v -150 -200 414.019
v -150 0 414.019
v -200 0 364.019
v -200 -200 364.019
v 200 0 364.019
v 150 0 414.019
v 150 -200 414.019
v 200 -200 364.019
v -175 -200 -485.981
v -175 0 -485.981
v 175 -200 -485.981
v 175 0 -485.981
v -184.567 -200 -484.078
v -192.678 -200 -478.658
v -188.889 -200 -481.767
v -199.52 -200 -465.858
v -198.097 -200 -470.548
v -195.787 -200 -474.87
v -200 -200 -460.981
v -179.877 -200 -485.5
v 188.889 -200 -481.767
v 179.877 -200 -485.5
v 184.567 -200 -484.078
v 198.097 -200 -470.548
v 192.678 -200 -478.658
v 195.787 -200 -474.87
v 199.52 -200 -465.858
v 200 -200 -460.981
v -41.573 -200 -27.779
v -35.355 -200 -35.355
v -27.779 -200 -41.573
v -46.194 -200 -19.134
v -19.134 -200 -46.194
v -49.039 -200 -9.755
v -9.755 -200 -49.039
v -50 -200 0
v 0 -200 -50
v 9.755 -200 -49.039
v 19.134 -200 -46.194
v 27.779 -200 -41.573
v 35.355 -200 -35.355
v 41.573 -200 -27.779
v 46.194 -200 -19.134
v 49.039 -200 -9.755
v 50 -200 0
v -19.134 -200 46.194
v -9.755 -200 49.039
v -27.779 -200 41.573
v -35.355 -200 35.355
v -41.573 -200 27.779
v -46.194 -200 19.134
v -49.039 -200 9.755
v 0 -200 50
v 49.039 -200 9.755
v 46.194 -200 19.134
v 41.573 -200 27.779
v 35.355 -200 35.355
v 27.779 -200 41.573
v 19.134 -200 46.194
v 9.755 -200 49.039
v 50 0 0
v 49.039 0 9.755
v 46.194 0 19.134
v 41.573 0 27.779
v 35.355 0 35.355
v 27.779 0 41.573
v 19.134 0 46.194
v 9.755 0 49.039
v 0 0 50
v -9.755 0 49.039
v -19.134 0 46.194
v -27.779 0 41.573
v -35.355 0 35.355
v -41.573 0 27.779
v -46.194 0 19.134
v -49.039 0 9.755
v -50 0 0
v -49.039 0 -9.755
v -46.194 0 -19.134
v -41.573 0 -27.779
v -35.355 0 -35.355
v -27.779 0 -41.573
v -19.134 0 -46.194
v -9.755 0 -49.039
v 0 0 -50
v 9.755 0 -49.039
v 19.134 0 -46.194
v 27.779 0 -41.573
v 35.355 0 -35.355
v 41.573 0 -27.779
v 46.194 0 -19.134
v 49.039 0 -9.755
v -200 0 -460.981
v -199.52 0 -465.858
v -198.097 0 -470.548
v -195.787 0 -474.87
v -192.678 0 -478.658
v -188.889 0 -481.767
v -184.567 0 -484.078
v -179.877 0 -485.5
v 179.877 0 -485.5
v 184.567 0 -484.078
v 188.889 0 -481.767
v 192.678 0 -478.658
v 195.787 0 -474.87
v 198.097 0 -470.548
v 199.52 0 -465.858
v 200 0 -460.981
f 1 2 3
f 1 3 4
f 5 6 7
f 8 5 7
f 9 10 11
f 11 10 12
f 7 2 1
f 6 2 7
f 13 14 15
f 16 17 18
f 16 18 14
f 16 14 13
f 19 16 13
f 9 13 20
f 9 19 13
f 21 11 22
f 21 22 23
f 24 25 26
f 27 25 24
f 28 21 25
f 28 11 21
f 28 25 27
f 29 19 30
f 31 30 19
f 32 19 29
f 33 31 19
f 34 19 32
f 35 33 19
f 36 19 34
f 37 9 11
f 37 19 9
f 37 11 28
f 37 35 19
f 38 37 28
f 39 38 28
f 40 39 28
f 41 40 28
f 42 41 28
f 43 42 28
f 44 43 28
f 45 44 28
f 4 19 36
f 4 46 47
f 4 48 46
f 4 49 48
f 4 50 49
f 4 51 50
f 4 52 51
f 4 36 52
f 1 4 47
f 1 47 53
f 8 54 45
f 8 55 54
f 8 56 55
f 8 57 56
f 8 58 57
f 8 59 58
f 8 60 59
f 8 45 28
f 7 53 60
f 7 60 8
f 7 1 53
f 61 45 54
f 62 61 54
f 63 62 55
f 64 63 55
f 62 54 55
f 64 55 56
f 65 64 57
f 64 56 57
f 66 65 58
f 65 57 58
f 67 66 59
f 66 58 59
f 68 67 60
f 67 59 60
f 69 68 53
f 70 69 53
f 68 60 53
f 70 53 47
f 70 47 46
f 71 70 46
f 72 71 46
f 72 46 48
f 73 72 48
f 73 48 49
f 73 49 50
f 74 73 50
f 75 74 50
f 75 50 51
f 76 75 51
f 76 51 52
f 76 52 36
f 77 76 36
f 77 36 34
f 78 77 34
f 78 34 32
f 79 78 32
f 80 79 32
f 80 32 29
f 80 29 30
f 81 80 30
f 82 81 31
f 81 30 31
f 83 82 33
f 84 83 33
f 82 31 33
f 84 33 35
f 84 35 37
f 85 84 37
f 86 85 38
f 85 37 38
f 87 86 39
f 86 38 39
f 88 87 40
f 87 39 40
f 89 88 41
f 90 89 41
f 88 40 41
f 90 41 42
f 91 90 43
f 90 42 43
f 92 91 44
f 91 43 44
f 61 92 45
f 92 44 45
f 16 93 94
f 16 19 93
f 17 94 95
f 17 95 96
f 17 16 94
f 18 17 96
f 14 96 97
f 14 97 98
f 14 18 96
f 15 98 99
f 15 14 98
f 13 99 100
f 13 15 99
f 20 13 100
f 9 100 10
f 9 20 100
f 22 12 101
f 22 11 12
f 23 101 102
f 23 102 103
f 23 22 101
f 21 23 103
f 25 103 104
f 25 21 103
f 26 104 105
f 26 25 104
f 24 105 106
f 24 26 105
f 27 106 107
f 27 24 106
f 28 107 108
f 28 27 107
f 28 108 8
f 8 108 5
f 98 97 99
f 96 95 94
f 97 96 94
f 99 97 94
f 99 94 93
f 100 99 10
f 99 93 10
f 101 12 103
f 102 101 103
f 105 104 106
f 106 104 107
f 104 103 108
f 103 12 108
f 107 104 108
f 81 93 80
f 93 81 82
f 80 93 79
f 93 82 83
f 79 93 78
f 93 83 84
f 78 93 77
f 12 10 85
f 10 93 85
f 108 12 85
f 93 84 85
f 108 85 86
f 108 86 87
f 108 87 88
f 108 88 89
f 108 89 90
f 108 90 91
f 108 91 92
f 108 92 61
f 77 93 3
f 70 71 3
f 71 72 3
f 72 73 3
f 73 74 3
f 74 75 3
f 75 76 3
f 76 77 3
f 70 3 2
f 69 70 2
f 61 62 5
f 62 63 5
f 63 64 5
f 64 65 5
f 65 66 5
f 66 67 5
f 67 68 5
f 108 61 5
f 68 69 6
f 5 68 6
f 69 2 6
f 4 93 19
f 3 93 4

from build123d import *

# Parameters (mm, degrees)
F0_W     = 400
F0_H     = 900
F1_DEPTH = 200
F2_SIZE  = 50
F3_R     = 25
F4_R     = 50
F5_DEPTH = 200.001


with BuildPart() as f1:
    # F0 (on Front) → F1 (new body)
    with BuildSketch(Plane.XZ):
        with Locations((0, -35.980602)):
            Rectangle(F0_W, F0_H)
    extrude(amount=F1_DEPTH)

    # F2
    f2_edges = [f1.edges().sort_by_distance(p)[0] for p in [
        (-200, -100, 414.019398),
        (200, -100, 414.019398),
    ]]
    chamfer(f2_edges, length=F2_SIZE)

    # F3
    f3_edges = [f1.edges().sort_by_distance(p)[0] for p in [
        (-200, -100, -485.980602),
        (200, -100, -485.980602),
    ]]
    fillet(f3_edges, radius=F3_R)

    # F4 (on face) → F5 (cut, through all)
    with BuildSketch(Plane.XZ.offset(200)):
        Circle(F4_R)
    extrude(amount=-F5_DEPTH, mode=Mode.SUBTRACT)


solid = f1.part
